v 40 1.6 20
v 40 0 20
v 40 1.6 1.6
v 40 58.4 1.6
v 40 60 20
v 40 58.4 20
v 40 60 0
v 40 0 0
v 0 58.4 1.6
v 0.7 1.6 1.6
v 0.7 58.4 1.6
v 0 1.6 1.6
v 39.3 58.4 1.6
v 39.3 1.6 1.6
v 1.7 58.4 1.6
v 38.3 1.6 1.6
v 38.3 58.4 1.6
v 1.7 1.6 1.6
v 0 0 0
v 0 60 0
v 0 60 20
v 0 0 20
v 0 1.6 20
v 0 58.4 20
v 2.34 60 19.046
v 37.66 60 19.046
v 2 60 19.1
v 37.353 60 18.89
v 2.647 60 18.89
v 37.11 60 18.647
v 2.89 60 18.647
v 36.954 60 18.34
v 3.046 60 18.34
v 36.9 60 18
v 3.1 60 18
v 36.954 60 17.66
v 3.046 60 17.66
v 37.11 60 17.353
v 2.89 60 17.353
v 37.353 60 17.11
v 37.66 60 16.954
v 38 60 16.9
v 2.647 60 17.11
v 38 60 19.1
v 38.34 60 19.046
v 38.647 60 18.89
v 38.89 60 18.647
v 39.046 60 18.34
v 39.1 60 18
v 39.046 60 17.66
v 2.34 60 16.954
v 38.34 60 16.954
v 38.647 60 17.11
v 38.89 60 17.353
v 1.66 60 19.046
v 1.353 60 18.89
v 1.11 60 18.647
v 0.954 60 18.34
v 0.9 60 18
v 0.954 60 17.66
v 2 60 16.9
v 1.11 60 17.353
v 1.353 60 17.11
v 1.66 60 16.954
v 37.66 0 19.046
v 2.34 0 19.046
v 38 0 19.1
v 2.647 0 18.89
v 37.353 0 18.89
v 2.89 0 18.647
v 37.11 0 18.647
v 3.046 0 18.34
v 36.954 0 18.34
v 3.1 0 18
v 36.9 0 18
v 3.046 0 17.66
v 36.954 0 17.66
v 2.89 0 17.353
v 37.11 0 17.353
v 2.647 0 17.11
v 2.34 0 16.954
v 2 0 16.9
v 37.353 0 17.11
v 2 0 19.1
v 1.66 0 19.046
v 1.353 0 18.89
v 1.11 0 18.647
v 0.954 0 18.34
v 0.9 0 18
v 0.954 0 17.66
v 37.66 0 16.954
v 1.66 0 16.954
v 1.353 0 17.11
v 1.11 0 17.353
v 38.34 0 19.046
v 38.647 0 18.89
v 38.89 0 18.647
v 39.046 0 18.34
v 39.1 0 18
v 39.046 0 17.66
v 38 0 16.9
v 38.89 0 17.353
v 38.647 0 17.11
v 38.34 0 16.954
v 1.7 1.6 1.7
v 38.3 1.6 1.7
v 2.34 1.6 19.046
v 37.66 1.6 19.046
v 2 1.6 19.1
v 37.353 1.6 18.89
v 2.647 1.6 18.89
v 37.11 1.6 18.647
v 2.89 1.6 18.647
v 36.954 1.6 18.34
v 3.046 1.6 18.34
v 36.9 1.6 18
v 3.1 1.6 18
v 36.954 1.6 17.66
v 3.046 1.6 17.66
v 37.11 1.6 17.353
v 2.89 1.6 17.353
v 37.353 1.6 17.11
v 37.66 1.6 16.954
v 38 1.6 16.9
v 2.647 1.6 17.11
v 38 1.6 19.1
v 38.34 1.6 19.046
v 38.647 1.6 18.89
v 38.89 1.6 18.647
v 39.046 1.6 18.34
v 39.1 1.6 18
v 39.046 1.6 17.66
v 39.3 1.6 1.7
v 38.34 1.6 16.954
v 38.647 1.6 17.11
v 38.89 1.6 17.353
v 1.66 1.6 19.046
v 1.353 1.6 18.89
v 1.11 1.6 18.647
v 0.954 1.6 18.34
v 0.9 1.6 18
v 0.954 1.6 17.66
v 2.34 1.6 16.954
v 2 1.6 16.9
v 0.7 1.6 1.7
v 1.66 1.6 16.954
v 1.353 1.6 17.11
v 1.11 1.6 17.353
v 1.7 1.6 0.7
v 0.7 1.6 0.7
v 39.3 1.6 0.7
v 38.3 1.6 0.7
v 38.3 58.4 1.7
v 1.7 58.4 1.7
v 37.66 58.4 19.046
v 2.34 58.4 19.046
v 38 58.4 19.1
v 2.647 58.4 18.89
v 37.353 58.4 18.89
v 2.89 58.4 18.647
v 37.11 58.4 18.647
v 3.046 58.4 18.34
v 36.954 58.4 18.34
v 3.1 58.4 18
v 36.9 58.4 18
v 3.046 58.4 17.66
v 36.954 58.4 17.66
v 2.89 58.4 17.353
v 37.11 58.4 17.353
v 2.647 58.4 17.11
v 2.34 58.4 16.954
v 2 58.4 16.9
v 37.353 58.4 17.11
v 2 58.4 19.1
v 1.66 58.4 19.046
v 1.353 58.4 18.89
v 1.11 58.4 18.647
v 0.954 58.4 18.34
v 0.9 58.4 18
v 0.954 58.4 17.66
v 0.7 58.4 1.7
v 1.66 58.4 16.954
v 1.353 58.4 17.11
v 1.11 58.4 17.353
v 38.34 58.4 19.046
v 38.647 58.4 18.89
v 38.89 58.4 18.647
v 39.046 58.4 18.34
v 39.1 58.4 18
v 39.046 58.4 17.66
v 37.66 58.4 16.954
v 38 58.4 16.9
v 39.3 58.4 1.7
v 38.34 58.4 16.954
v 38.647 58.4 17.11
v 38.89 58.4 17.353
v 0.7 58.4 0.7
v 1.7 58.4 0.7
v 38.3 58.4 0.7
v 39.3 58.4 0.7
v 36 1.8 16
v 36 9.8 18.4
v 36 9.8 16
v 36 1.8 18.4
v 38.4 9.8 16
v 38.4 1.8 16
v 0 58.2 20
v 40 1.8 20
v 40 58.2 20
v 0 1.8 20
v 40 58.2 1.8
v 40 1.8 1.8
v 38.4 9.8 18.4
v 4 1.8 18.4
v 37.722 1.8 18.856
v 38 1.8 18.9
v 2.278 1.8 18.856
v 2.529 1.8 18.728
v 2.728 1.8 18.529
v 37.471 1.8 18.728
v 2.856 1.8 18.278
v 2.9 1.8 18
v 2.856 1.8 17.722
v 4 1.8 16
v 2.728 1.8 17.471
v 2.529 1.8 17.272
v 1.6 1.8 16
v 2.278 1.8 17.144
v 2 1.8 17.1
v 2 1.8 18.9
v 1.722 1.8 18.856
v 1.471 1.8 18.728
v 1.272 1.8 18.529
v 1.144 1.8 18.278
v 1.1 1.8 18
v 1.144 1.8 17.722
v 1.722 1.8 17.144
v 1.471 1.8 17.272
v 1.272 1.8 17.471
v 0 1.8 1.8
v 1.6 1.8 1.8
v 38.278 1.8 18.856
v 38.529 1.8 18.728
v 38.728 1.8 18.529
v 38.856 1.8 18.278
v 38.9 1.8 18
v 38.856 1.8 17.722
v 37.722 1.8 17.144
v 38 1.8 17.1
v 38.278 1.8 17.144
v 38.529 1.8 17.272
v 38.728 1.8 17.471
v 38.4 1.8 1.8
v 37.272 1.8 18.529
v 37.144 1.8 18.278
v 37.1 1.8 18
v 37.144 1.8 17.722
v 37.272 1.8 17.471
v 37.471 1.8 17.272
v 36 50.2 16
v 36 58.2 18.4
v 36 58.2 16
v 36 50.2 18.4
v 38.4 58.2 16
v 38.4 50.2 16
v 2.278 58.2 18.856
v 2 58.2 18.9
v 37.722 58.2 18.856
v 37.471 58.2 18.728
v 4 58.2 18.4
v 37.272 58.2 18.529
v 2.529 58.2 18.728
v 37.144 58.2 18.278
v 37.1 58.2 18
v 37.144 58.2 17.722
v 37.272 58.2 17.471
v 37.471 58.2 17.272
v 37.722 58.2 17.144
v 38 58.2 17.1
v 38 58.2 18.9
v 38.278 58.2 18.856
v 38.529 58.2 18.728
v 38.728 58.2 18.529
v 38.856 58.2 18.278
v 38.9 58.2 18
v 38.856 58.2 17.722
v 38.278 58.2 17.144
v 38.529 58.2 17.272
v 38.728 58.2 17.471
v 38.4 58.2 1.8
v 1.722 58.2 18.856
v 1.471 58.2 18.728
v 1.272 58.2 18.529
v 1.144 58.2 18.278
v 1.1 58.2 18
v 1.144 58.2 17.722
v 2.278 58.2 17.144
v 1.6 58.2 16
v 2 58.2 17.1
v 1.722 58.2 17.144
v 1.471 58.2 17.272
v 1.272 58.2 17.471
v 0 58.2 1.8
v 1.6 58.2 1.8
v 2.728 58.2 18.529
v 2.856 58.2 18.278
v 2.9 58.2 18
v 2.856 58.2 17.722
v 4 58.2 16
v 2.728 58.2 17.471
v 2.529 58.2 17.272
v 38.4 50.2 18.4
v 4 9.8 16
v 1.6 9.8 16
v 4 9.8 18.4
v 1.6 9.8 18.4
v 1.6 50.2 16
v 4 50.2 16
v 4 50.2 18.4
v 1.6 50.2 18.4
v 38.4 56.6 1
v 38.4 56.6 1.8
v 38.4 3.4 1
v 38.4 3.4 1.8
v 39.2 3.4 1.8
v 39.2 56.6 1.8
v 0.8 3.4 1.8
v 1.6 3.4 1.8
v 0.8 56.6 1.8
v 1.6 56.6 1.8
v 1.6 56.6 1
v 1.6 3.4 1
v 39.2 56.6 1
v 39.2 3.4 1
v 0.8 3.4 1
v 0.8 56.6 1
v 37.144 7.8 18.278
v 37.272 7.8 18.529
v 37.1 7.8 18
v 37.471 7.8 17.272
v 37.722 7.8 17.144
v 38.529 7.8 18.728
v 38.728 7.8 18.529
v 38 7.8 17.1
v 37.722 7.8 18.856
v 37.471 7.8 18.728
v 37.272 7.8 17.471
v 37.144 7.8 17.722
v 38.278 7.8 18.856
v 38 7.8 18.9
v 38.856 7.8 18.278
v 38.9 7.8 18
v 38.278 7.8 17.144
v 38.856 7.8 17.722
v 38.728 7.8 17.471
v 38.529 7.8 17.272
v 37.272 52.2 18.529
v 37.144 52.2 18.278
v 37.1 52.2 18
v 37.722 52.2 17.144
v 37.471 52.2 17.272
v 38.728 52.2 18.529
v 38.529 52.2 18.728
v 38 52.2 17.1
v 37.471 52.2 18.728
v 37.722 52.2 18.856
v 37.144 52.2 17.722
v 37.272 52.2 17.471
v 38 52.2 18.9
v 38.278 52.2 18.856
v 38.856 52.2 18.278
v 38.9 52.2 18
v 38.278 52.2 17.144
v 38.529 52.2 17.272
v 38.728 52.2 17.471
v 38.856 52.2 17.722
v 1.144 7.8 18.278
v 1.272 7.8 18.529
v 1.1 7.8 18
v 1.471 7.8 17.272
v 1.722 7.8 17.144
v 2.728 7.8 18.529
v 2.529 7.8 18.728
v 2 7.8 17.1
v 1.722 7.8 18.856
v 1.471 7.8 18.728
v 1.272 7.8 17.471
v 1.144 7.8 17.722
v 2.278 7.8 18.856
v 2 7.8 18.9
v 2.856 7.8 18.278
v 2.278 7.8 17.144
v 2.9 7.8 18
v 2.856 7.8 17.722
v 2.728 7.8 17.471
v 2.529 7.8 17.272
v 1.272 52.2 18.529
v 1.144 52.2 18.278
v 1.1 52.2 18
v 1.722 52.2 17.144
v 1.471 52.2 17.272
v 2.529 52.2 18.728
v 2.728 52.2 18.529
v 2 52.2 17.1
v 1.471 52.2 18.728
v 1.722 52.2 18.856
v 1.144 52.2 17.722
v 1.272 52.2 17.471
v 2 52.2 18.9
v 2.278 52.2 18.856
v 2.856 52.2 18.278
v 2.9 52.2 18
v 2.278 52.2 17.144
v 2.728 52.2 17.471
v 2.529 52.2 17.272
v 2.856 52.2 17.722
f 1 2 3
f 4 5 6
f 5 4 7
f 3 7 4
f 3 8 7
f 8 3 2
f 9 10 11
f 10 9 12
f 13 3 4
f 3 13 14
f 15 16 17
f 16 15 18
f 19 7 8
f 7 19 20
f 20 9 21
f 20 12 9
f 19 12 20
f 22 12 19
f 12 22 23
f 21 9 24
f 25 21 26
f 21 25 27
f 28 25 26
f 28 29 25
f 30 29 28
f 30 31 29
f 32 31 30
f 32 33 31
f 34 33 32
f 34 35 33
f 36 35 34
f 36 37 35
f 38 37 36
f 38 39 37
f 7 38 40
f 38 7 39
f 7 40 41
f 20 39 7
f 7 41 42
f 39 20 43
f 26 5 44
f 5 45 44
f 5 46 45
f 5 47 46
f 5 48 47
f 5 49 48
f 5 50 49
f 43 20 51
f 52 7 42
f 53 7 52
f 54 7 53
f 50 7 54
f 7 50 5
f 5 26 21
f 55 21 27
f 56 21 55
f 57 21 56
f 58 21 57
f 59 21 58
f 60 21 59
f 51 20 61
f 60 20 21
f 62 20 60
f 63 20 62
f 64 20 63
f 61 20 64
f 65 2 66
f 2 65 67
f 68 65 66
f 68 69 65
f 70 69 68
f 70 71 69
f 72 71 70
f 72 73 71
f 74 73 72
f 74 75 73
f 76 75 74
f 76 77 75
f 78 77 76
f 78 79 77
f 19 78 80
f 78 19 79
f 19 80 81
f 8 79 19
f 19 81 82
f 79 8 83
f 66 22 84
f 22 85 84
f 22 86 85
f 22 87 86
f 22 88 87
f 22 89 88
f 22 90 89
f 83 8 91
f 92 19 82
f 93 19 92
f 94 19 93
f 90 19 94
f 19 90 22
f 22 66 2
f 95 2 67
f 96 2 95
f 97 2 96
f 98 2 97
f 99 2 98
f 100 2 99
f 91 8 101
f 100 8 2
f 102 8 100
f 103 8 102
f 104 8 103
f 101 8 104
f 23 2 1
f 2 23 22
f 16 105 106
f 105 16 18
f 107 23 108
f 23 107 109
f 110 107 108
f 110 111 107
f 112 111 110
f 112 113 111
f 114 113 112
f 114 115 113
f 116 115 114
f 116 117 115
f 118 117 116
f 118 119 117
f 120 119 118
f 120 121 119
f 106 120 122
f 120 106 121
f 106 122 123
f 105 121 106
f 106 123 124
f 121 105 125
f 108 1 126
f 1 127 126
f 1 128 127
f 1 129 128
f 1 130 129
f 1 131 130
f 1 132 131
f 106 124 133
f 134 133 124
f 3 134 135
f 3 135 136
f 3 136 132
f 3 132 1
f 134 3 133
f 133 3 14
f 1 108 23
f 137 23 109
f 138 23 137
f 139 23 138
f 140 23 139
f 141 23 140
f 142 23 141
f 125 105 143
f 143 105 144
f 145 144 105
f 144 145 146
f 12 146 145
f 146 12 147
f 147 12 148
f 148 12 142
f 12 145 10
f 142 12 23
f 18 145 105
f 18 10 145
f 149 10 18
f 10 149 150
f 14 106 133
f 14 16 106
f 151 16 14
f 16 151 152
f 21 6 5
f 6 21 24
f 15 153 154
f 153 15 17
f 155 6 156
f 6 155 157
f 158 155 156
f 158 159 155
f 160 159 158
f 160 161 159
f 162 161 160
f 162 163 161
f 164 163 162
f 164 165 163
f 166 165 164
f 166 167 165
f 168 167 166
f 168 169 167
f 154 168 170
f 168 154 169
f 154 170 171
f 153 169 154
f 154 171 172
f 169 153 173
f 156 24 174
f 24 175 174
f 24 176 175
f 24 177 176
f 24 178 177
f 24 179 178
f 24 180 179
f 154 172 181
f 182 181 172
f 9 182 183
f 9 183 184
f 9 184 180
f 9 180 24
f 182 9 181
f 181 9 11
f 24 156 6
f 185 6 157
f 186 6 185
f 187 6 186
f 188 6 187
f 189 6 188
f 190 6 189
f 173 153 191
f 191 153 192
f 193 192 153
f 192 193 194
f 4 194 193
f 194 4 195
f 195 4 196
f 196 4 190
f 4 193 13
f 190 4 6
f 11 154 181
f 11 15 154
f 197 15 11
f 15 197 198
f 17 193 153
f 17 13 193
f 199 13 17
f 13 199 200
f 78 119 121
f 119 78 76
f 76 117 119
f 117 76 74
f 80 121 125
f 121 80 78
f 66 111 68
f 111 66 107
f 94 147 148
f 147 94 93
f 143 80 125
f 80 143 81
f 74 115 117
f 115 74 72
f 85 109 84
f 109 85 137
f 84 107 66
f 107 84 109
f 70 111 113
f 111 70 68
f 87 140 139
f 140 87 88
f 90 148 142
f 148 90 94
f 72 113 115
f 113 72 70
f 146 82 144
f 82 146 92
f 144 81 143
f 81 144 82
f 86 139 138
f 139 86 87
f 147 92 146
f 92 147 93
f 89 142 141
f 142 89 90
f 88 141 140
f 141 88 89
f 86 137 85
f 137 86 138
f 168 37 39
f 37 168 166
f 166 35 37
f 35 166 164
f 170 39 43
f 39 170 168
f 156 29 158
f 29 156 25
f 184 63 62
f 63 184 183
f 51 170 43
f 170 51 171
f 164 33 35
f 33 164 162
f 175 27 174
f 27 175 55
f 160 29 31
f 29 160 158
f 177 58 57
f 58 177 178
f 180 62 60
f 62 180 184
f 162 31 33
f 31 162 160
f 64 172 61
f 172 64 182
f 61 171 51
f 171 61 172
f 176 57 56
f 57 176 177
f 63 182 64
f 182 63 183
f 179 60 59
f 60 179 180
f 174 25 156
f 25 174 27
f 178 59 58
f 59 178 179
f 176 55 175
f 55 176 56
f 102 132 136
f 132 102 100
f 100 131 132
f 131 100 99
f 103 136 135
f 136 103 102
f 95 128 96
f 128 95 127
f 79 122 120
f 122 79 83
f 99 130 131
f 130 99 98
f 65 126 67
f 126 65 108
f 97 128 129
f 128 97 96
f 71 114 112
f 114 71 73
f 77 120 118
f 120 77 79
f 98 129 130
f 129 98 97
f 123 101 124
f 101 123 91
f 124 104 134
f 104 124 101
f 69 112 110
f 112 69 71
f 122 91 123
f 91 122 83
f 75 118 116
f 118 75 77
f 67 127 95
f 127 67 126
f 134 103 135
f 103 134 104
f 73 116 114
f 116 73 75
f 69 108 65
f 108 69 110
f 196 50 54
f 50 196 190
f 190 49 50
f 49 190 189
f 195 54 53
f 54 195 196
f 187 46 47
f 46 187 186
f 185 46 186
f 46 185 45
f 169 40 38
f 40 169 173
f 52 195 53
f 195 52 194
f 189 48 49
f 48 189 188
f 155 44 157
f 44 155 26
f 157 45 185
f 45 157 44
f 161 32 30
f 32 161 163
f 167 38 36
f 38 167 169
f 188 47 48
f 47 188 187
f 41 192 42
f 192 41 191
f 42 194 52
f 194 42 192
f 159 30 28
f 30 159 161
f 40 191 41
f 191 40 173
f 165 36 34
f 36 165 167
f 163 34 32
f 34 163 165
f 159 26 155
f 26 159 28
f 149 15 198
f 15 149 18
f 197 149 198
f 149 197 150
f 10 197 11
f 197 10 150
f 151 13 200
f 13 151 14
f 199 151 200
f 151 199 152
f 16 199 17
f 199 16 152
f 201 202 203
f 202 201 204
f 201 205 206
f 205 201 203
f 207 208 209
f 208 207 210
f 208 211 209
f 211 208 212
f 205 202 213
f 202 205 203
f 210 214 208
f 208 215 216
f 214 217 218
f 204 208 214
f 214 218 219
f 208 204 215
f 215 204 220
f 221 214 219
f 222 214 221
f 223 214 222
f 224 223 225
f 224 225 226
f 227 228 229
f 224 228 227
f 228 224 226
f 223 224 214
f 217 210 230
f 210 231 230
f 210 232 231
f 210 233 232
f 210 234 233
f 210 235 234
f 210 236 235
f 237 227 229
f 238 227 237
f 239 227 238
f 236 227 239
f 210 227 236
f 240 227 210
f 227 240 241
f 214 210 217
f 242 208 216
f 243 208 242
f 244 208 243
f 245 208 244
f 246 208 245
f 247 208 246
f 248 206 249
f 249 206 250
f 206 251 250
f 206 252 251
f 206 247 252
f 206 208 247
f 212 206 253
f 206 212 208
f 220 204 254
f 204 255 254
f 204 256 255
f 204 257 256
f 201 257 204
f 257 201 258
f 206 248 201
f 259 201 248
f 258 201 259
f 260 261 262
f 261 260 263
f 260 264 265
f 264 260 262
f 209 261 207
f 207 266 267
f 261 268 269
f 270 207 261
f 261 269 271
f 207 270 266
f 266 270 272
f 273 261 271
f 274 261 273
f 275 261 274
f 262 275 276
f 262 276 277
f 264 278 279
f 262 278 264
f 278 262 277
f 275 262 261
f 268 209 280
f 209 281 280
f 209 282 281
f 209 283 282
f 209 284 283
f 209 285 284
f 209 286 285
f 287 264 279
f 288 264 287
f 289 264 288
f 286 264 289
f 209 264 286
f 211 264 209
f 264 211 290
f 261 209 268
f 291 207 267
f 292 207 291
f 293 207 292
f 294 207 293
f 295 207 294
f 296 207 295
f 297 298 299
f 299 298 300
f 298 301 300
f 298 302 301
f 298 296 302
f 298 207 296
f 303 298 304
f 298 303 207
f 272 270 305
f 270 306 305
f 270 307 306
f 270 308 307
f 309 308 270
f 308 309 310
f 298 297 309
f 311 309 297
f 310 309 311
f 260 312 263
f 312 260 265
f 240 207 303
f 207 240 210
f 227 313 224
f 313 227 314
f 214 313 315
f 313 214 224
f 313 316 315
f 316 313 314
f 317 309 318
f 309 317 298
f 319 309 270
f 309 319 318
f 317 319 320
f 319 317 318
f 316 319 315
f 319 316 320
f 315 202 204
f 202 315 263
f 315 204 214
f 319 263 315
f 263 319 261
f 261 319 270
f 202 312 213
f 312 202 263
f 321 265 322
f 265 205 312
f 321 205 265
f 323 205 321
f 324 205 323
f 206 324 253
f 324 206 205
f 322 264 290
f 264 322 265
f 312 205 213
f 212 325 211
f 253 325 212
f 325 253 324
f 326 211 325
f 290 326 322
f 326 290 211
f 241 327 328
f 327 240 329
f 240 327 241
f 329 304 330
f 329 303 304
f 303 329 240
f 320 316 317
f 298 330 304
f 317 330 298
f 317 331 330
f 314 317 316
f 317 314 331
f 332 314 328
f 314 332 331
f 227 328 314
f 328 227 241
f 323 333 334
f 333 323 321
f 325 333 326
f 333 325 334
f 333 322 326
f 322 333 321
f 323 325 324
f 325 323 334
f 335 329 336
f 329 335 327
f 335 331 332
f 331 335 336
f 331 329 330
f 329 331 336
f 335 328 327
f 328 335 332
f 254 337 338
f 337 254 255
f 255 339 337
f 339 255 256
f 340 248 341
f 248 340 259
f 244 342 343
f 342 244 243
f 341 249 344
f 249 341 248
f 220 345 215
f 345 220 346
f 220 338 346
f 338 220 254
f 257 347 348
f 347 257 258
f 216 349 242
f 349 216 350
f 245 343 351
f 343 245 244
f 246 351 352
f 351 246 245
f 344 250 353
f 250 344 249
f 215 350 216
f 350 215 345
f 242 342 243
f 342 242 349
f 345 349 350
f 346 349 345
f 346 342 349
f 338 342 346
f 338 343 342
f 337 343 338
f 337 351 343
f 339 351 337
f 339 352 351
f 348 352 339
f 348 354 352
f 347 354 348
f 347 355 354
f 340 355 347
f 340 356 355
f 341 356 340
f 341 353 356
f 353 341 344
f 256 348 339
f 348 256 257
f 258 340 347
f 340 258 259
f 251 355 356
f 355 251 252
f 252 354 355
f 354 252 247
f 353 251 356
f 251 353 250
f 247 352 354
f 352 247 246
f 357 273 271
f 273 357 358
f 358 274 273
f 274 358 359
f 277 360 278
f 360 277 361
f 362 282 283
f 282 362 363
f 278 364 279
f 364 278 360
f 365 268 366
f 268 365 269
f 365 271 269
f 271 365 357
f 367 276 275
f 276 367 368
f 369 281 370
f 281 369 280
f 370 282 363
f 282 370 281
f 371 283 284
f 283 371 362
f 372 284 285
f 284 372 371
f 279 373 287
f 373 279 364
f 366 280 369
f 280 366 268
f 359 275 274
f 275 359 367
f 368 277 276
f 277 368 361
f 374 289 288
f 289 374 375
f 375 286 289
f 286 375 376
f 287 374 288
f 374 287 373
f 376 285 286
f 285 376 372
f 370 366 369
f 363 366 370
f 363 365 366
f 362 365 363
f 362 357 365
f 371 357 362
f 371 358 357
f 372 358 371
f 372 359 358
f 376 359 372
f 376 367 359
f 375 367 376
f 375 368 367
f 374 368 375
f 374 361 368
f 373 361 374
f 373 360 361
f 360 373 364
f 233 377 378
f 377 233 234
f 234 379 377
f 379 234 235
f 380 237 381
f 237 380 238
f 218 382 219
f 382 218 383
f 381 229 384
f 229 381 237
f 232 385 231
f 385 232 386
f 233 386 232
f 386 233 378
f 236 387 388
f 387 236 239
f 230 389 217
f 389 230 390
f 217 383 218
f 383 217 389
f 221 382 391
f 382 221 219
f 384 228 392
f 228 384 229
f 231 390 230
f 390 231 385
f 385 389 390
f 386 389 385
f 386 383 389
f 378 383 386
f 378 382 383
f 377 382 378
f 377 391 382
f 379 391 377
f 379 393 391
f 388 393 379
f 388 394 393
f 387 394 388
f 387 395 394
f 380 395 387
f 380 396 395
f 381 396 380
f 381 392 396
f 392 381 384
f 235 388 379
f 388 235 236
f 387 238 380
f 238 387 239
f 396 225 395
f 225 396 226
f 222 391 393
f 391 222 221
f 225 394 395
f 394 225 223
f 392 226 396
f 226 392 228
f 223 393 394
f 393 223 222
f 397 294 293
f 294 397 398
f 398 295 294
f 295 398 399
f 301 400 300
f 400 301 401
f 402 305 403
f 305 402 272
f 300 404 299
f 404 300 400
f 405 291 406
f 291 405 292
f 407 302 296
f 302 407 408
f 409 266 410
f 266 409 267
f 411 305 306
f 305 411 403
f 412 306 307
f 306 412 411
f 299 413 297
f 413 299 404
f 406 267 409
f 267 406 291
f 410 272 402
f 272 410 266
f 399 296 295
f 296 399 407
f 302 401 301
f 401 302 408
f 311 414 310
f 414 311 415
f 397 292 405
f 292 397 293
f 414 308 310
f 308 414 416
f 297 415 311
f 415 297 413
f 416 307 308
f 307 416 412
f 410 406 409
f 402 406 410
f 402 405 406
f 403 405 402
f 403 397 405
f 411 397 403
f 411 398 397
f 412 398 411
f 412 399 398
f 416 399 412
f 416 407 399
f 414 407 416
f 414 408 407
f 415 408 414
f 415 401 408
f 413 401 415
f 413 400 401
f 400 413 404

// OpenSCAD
// file: ../simple-case.scad
// SPDX-FileCopyrightText: 2024 Rafael G. Martins <rafael@rafaelmartins.eng.br>
// SPDX-License-Identifier: CERN-OHL-S-2.0

module simple_case_base(width, length, height, thickness=1.6, screw_d=2, screw_p=2, gap=0) {
    difference() {
        union() {
            cube([width, length, thickness]);
            cube([width, thickness, height]);
            translate([0, length - thickness, 0])
                cube([width, thickness, height]);
        }

        translate([(thickness - gap) / 2, thickness, (thickness - gap) / 2])
            cube([gap + thickness / 2, length - 2 * thickness, gap + thickness / 2]);
        translate([width - thickness - gap / 2, thickness, (thickness - gap) / 2])
            cube([gap + thickness / 2, length - 2 * thickness, gap + thickness / 2]);

        for (i=[0:1])
            for (j=[0:1])
                translate([i * (width - screw_d - screw_p) + (screw_d + screw_p) / 2,
                           j * (length - thickness),
                           height - (screw_d + screw_p) / 2])
                    rotate([-90, 0, 0])
                        cylinder(h=thickness, d=screw_d * 1.1, $fn=20);
    }
}

module simple_case_cover(width, length, height, thickness=1.6, screw_d=2, screw_p=2, screw_h=6, gap=0) {
    difference() {
        union() {
            cube([width, length - 2 * (thickness + gap), thickness]);
            cube([thickness, length - 2 * (thickness + gap), height - thickness - gap]);
            translate([width - thickness, 0, 0])
                cube([thickness, length - 2 * (thickness + gap), height - thickness - gap]);

            for (i=[0:1])
                for (j=[0:1])
                    translate([i * (width - screw_d - screw_p),
                               j * (length - 2 * (thickness + gap) - screw_h - screw_p), 0])
                        cube([screw_d + screw_p, screw_h + screw_p, screw_d + screw_p]);

            translate([thickness / 2, thickness, height - thickness - gap])
                cube([thickness / 2, length - 4 * thickness - 2 * gap, thickness / 2]);
            translate([width - thickness, thickness, height - thickness - gap])
                cube([thickness / 2, length - 4 * thickness - 2 * gap, thickness / 2]);
        }

        for (i=[0:1])
            for (j=[0:1])
                translate([i * (width - screw_d - screw_p) + (screw_d + screw_p) / 2,
                           j * (length - 2 * (thickness + gap) - screw_h),
                           (screw_d + screw_p) / 2])
                    rotate([-90, 0, 0])
                        cylinder(h=screw_h, d=screw_d * 0.9, $fn=20);
    }
}
// main file
// SPDX-FileCopyrightText: 2024 Rafael G. Martins <rafael@rafaelmartins.eng.br>
// SPDX-License-Identifier: CERN-OHL-S-2.0

include <../simple-case.scad>

width = 40;
length = 60;
height = 20;
thickness = 1.6;
gap = 0.2;


simple_case_base(width, length, thickness=thickness, height, gap=gap);

translate([width, thickness + gap, height])
    rotate([0, 180, 0])
        simple_case_cover(width, length, height, thickness=thickness, gap=gap);
